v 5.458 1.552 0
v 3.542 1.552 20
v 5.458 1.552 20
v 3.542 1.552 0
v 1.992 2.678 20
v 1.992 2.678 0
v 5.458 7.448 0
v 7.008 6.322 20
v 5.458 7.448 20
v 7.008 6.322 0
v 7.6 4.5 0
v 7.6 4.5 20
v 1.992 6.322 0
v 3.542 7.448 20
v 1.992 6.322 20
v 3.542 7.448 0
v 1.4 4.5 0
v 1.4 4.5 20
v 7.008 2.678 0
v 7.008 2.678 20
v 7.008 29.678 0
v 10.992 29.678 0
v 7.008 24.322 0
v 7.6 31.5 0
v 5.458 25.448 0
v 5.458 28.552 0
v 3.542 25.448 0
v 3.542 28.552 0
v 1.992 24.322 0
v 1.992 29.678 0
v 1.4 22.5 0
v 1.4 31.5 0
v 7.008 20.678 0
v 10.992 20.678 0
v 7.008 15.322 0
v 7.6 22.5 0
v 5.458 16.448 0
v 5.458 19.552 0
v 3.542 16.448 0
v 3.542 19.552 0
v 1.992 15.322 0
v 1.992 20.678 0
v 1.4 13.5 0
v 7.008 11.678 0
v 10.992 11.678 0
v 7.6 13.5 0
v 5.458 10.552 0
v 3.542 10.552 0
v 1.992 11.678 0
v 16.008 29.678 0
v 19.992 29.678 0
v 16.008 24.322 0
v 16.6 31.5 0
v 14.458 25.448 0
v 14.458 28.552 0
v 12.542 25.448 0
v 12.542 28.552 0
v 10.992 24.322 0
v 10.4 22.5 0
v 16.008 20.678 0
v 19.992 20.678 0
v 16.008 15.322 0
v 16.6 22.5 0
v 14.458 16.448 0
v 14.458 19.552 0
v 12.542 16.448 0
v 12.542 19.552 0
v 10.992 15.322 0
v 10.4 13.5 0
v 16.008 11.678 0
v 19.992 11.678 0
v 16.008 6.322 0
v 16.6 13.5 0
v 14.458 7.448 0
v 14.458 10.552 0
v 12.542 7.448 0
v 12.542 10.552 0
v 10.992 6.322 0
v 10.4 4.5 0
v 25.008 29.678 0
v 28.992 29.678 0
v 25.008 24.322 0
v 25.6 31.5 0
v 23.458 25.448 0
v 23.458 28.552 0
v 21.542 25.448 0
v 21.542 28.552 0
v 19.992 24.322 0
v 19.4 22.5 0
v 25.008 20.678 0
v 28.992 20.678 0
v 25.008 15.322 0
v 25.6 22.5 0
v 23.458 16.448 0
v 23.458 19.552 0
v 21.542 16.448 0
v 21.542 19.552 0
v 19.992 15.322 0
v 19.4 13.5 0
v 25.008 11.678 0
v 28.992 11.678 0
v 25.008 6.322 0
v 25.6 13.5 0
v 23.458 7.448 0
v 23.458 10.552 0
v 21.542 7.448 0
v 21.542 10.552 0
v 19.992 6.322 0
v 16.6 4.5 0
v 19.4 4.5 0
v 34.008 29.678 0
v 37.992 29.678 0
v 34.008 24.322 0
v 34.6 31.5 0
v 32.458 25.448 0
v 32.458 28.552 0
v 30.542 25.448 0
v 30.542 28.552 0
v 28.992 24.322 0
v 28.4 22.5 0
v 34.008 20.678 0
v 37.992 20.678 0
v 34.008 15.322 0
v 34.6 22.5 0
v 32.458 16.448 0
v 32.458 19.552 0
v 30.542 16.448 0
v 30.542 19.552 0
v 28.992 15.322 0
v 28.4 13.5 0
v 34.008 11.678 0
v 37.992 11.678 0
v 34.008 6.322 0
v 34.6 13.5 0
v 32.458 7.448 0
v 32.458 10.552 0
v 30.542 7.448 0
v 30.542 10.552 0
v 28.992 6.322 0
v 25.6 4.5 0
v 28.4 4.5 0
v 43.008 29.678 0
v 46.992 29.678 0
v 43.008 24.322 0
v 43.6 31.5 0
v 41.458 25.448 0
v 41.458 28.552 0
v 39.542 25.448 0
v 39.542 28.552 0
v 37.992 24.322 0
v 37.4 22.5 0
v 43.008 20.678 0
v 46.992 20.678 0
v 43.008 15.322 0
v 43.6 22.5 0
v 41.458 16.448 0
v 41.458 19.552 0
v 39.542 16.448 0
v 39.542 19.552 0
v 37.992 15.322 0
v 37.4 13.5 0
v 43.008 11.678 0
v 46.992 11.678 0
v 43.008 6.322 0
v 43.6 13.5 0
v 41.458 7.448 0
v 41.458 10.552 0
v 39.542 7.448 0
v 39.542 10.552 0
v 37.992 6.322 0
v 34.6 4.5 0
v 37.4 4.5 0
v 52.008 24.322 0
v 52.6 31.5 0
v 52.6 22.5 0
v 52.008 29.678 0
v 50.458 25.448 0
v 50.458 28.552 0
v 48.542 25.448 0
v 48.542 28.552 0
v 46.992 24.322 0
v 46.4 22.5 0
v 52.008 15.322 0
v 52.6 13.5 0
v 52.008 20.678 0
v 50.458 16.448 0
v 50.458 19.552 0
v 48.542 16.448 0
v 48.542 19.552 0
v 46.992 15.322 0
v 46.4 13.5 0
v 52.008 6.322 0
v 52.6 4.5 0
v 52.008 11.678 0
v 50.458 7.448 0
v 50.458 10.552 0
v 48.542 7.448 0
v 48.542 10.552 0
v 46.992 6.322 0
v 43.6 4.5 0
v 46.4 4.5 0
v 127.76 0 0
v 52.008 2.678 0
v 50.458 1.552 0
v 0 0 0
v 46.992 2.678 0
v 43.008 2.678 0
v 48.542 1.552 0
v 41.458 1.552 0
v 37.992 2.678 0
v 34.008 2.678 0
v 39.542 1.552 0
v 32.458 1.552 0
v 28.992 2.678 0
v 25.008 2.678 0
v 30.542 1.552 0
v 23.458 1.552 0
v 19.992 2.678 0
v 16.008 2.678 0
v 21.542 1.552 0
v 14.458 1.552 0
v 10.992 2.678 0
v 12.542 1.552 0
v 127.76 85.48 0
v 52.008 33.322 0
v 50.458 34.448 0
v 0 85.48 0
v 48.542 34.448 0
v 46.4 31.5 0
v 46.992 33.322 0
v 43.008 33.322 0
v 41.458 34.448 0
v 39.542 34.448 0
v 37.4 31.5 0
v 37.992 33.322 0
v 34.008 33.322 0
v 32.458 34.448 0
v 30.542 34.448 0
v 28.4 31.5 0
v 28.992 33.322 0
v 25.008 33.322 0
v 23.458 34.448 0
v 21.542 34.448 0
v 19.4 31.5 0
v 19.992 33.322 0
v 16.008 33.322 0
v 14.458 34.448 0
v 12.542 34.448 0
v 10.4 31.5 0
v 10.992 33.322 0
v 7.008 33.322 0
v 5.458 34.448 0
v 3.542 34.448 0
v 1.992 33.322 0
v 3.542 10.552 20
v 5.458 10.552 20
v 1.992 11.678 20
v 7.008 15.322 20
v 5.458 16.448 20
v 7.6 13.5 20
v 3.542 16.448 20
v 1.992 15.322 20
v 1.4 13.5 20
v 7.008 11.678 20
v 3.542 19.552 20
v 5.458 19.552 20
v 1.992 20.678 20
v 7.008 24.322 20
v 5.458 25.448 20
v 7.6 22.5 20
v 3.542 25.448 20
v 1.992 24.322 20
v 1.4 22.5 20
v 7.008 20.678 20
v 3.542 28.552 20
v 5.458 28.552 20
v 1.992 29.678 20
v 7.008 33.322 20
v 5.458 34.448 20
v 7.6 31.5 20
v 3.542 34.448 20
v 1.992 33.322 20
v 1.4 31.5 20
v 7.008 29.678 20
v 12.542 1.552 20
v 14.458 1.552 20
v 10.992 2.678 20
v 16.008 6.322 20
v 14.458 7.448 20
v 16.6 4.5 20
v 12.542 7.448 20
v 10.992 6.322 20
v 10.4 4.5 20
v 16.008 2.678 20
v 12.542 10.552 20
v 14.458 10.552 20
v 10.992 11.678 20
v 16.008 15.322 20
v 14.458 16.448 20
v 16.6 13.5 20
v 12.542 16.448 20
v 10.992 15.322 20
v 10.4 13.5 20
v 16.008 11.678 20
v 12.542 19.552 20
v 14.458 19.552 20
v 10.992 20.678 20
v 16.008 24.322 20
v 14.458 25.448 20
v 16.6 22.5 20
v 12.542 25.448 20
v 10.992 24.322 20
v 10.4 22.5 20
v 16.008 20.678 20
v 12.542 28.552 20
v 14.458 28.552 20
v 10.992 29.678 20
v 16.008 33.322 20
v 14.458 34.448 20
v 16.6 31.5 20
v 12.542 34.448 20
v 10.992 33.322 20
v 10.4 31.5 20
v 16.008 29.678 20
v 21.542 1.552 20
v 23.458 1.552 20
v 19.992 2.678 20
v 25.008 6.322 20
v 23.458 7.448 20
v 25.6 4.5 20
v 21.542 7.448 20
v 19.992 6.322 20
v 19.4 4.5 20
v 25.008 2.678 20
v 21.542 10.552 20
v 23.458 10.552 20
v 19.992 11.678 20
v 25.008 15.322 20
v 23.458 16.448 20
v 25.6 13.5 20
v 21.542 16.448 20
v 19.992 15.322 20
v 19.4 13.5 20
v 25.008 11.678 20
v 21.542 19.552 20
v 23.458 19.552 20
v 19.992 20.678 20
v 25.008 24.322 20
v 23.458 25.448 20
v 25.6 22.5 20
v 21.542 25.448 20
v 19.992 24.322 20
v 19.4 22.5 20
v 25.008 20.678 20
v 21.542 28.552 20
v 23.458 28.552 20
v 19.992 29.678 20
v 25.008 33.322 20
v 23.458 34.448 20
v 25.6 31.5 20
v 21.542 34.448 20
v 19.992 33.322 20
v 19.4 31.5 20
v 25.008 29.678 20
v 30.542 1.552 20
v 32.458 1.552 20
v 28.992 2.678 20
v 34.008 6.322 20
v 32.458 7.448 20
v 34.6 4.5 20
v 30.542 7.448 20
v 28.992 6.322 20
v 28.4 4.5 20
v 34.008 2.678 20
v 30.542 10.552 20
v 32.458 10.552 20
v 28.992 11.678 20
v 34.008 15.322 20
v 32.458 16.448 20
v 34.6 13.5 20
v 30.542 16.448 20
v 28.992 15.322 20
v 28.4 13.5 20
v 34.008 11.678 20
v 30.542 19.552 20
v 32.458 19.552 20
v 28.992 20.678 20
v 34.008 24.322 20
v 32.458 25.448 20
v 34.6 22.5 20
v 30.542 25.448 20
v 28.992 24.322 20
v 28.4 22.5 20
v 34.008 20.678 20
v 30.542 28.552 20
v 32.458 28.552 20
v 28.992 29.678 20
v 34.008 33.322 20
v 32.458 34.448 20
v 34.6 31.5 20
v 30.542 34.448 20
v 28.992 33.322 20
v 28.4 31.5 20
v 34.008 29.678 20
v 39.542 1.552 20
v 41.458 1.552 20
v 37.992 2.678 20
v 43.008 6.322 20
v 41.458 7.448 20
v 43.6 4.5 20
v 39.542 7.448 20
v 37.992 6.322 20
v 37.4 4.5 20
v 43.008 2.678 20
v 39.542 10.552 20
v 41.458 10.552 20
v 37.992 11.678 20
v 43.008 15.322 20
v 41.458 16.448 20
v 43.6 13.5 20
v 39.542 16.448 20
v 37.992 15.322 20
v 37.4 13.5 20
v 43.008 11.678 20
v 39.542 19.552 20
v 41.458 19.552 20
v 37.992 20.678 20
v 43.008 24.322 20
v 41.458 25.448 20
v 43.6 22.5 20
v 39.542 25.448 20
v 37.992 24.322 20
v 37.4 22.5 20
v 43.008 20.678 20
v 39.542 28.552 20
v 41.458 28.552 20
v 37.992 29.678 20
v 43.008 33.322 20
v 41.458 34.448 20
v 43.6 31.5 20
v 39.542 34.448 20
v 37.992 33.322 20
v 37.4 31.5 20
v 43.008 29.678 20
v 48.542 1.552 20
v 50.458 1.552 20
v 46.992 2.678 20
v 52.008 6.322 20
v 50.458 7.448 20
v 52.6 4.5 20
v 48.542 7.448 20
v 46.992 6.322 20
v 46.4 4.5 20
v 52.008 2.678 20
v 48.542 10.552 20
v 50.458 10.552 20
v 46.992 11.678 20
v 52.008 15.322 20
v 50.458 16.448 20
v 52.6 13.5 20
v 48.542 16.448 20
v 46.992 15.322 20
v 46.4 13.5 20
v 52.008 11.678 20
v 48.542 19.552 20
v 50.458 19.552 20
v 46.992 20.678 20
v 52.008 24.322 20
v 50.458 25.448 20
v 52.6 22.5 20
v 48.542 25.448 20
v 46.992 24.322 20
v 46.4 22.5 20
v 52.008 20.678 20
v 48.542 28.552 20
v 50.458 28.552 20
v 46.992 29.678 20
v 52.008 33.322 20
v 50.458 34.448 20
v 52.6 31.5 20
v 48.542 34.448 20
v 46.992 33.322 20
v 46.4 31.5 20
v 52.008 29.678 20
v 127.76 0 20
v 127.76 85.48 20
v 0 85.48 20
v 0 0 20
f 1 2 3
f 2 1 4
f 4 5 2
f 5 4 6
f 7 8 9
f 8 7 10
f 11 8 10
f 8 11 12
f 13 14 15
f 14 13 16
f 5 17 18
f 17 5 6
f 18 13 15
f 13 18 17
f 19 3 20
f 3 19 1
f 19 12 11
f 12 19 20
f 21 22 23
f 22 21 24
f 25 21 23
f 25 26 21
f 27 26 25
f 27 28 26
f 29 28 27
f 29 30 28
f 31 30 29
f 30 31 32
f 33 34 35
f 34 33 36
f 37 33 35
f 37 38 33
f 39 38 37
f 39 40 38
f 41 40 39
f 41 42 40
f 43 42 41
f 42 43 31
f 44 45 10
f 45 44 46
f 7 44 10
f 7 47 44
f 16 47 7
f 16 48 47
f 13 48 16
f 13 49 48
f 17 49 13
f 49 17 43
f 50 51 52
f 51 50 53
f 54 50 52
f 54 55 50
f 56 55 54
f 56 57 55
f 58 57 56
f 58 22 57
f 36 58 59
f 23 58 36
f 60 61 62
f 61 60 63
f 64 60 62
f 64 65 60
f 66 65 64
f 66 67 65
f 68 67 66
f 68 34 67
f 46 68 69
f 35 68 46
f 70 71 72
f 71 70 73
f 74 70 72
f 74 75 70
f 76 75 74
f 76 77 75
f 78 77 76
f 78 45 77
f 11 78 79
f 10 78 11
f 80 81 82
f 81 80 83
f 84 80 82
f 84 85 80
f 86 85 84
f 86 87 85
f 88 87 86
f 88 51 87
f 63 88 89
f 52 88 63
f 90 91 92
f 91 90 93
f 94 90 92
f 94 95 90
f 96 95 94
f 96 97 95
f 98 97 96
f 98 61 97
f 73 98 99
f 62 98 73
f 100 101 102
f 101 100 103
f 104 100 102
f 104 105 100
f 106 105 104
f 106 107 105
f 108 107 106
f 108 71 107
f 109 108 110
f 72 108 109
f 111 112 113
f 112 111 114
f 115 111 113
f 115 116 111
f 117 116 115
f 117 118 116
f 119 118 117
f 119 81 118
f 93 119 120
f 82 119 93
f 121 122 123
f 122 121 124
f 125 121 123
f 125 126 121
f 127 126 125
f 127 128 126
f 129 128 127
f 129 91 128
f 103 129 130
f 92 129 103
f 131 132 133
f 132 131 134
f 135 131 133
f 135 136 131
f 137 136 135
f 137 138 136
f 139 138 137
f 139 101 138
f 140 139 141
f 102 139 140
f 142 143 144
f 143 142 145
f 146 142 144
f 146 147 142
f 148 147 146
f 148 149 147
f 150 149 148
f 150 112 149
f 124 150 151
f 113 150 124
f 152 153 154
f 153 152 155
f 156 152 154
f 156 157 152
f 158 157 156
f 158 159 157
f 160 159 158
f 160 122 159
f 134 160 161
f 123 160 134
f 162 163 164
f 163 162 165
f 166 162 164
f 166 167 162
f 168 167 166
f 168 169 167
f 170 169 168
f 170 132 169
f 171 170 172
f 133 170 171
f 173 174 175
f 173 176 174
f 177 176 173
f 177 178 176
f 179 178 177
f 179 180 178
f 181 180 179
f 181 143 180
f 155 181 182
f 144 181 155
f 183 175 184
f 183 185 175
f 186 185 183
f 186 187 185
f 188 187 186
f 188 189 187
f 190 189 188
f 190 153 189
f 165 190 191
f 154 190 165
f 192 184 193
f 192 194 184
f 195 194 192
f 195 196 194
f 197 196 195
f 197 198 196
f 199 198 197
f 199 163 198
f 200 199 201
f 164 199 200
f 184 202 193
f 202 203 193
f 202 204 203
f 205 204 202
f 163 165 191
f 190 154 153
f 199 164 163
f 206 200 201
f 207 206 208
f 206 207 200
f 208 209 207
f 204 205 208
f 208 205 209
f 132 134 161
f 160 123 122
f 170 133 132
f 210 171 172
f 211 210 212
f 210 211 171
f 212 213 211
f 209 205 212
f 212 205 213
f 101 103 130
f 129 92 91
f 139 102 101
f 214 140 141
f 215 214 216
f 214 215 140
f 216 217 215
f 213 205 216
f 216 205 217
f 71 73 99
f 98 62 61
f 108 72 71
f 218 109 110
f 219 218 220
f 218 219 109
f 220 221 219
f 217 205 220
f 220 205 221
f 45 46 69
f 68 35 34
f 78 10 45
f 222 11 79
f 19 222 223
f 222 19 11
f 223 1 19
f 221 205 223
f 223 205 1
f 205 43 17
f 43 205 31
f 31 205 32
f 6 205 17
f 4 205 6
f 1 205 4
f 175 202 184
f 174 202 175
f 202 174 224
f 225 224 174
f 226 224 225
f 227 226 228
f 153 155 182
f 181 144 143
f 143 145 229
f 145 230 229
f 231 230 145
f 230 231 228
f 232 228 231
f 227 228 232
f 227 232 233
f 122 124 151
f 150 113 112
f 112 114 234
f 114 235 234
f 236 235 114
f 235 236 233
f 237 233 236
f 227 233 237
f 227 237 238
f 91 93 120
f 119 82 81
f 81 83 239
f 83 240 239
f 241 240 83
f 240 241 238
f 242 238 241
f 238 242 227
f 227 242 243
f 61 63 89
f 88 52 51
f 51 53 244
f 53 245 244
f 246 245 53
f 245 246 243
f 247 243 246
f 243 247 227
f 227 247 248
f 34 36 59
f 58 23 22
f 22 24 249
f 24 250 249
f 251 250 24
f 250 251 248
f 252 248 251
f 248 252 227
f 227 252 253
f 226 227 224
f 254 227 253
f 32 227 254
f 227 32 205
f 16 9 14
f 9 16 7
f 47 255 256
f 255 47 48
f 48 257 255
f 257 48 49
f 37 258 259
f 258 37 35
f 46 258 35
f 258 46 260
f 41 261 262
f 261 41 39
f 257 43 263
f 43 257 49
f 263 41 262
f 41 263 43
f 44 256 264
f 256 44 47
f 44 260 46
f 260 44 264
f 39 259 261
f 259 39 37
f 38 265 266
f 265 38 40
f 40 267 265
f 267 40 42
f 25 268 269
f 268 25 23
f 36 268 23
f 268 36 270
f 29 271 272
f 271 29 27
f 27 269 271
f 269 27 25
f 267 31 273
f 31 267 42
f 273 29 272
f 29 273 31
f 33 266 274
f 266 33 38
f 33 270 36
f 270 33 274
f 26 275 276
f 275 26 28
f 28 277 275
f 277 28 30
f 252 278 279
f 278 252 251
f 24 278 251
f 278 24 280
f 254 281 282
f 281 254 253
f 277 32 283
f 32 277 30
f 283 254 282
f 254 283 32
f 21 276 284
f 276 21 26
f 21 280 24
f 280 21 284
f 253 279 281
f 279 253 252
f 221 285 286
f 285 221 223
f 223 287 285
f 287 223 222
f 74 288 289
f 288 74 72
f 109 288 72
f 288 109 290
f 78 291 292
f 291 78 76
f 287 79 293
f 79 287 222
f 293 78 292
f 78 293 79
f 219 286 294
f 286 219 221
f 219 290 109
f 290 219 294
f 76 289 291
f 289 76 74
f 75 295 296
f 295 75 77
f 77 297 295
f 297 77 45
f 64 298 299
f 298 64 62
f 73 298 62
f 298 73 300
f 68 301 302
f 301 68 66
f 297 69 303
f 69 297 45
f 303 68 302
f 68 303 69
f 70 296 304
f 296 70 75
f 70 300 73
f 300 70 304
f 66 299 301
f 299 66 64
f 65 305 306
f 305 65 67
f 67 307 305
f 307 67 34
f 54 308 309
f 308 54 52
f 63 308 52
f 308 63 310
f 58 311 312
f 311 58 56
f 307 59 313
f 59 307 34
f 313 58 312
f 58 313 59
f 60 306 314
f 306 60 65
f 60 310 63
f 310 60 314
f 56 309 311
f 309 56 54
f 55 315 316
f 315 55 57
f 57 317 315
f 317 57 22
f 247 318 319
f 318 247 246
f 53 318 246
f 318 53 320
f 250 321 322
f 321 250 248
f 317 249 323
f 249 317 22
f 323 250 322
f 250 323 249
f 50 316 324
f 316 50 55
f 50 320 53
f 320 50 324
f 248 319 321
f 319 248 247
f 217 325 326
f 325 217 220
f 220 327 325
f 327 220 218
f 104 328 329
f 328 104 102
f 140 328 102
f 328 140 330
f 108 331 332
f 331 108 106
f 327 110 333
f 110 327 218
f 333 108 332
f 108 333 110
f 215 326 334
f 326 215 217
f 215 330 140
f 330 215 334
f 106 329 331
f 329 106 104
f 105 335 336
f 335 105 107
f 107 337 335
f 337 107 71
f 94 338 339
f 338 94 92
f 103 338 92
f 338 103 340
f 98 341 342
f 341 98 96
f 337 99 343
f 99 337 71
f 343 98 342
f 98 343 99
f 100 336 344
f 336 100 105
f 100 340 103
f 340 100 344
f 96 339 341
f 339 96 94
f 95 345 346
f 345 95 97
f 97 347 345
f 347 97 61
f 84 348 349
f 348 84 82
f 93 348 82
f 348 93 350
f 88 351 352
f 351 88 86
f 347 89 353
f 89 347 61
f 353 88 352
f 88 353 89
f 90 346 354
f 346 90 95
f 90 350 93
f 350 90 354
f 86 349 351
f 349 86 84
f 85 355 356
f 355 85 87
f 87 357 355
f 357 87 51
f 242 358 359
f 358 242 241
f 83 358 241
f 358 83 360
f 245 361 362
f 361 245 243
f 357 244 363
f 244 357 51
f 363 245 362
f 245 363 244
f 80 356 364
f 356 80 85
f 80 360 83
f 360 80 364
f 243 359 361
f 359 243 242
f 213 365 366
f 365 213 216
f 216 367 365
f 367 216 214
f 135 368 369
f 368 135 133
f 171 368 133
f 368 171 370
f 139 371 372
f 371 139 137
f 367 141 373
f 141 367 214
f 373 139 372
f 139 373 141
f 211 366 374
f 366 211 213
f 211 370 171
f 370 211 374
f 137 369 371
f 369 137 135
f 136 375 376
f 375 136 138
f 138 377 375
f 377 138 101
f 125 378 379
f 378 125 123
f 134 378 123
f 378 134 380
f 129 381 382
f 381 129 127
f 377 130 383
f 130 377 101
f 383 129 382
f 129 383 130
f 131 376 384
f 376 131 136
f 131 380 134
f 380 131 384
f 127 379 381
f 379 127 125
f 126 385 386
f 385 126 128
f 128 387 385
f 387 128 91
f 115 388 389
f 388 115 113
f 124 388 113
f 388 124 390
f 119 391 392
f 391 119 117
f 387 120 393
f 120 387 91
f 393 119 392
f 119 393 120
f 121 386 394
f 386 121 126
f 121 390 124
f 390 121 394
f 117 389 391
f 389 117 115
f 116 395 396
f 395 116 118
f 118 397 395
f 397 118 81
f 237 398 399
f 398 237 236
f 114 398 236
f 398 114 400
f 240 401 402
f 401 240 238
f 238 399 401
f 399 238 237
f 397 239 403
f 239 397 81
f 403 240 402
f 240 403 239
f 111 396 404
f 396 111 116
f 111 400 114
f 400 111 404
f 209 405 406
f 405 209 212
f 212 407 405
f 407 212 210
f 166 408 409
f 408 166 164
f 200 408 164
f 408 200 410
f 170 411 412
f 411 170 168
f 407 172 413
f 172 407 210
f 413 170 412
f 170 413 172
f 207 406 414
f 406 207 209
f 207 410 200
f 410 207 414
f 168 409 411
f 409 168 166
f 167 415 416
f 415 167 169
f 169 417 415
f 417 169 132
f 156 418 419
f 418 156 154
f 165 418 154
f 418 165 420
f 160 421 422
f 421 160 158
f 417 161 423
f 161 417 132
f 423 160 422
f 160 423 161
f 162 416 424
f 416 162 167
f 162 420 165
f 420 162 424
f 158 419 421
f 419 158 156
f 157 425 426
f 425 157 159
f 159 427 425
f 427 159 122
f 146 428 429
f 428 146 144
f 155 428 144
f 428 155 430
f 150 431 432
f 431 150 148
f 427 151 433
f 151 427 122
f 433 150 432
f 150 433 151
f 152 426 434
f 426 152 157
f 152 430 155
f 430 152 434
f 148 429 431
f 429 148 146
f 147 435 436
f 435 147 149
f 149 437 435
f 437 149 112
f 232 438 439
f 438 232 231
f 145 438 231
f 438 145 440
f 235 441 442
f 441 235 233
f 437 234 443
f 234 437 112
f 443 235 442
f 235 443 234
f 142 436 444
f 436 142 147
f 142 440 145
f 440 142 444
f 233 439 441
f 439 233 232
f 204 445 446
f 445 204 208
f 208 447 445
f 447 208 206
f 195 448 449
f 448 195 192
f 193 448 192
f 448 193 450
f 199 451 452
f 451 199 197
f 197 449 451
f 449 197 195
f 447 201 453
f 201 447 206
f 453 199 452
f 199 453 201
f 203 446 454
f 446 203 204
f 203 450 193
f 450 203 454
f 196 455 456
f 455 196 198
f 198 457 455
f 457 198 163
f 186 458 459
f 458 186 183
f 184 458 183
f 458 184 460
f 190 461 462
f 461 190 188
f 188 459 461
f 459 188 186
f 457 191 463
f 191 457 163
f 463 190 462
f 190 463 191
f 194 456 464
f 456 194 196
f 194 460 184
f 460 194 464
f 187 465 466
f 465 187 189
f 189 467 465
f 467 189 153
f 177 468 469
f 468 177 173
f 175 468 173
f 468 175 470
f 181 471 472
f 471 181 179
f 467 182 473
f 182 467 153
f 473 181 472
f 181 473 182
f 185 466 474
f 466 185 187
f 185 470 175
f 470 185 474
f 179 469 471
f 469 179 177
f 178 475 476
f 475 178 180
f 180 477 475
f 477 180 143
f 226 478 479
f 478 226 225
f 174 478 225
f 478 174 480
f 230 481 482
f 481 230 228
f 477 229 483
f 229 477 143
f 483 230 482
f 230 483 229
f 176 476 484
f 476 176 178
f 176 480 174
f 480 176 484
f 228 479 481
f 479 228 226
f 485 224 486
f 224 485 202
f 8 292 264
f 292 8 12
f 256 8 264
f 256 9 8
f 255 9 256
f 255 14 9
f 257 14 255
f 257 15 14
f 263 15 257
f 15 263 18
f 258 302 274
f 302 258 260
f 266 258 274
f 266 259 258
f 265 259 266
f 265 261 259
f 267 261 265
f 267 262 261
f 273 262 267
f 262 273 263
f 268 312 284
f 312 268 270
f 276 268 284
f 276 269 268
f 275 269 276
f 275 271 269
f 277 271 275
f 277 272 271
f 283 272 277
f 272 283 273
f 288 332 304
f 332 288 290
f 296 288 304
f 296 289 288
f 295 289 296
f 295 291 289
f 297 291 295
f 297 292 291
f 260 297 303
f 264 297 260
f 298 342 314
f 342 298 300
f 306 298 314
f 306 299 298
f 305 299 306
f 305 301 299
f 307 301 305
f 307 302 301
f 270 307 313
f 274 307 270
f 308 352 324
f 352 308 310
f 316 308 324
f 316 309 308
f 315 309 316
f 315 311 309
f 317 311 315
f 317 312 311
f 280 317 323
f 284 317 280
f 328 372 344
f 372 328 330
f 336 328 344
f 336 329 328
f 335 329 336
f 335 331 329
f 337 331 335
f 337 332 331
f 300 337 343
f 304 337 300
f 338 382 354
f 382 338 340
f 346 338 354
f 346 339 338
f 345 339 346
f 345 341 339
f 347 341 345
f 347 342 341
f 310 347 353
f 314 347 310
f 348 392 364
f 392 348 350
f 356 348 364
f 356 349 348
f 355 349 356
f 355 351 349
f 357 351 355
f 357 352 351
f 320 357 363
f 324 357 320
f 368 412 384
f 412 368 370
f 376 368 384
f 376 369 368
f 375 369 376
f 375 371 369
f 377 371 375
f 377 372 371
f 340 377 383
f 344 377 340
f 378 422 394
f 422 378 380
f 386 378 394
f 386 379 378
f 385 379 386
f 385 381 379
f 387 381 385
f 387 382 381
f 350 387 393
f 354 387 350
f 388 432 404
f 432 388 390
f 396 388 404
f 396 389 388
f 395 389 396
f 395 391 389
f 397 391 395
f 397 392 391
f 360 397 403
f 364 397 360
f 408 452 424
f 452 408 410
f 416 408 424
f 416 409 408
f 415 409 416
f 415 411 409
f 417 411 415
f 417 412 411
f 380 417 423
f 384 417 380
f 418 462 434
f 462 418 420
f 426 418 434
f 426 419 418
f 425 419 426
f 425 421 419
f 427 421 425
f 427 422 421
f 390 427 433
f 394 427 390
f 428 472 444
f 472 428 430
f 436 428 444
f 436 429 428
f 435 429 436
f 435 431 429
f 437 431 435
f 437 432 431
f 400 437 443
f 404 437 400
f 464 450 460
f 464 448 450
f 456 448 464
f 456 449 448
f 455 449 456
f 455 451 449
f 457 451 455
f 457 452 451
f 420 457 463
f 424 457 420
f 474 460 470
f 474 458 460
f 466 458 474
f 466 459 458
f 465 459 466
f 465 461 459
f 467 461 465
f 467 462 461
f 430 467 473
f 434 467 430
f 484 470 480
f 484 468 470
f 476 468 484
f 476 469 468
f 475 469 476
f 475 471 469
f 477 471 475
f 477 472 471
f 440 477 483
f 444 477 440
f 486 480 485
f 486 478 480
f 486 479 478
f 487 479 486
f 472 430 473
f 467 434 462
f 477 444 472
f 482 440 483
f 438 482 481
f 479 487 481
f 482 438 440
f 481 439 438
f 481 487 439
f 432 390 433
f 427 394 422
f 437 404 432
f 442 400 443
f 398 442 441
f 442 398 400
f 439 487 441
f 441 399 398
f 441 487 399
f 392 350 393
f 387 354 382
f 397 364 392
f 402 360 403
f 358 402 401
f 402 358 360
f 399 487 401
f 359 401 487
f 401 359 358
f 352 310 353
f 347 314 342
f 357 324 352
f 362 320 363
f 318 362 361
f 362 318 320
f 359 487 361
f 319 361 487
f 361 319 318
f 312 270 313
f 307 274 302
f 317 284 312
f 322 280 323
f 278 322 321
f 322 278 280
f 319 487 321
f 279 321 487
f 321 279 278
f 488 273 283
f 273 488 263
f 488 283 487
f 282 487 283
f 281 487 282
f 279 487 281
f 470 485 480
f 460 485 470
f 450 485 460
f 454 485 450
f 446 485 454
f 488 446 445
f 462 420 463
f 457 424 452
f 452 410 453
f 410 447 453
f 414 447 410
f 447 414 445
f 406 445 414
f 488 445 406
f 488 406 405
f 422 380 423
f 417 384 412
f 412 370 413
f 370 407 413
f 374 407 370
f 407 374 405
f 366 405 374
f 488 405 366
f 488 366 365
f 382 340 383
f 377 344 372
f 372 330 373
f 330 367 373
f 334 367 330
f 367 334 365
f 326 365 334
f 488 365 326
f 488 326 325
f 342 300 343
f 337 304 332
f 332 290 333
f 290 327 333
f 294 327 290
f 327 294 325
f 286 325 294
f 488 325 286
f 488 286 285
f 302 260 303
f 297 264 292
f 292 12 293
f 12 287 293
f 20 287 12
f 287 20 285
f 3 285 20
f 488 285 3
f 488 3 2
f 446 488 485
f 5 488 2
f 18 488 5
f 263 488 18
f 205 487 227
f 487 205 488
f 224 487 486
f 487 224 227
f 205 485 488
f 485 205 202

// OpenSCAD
// Block dimensions
BLOCK_LENGTH = 127.76;    // X dimension (length)
BLOCK_WIDTH = 85.48;      // Y dimension (width)
BLOCK_HEIGHT = 20;       // Z dimension (height)

// Hole specifications
HOLE_DIAMETER = 6.2;     // Hole diameter
HOLE_SPACING = 9.0;    // Center-to-center spacing
NUM_ROWS = 8;            // Rows along Y axis
NUM_COLS = 12;           // Columns along X axis

// First hole (A1) position from edges
HOLE_A1_X_OFFSET = 14.38;  // From left edge
HOLE_A1_Y_OFFSET = 11.24;  // From back edge

// Chamfer specifications
CHAMFER_SIZE = 5;          // Leg length
CHAMFER_DEPTH = 20.01;    // Slightly past block height

// Calculate hole grid positions
// Block center is at origin (0, 0)
// Left edge at X = -BLOCK_LENGTH/2
// Back edge at Y = -BLOCK_WIDTH/2

FIRST_HOLE_X = -BLOCK_LENGTH/2 + HOLE_A1_X_OFFSET;
FIRST_HOLE_Y = -BLOCK_WIDTH/2 + HOLE_A1_Y_OFFSET;

// Create the base block (resting on XY plane at z=0)
module base_block() {
    cube([BLOCK_LENGTH, BLOCK_WIDTH, BLOCK_HEIGHT], center = false);
}

// Create the hole grid
module hole_grid() {
    for (col = [0:NUM_COLS-1]) {
        for (row = [0:NUM_ROWS-1]) {
            hole_x = FIRST_HOLE_X + col * HOLE_SPACING;
            hole_y = FIRST_HOLE_Y + row * HOLE_SPACING;
            translate([hole_x, hole_y, 0]) {
                cylinder(d = HOLE_DIAMETER, h = BLOCK_HEIGHT + 0.01, center = false);
            }
        }
    }
}

// Create the chamfer at A1 corner (45-degree, 5mm legs)
// A1 corner is at FIRST_HOLE_X, FIRST_HOLE_Y
// Chamfer cuts 5mm from both X and Y edges at 45 degrees
module chamfer() {
    // Create a triangular wedge that cuts the corner
    // The wedge extends from the corner diagonally
    translate([FIRST_HOLE_X, FIRST_HOLE_Y, 0]) {
        // Create a triangular prism that cuts the corner
        // Base triangle with legs of 5mm at 45 degrees
        difference() {
            // Create a cube that covers the chamfer area
            cube([CHAMFER_SIZE * 2, CHAMFER_SIZE * 2, CHAMFER_DEPTH], center = false);
            // Cut away the corner with a diagonal plane
            // Using a rotated cube to create the 45-degree cut
            rotate([0, 0, 45]) {
                cube([CHAMFER_SIZE * 2, CHAMFER_SIZE * 2, CHAMFER_DEPTH], center = false);
            }
        }
    }
}

// Main assembly - create block with holes and chamfer
// Part rests on XY plane at z=0
difference() {
    base_block();
    // Subtract holes
    hole_grid();
    // Subtract chamfer
    chamfer();
}
